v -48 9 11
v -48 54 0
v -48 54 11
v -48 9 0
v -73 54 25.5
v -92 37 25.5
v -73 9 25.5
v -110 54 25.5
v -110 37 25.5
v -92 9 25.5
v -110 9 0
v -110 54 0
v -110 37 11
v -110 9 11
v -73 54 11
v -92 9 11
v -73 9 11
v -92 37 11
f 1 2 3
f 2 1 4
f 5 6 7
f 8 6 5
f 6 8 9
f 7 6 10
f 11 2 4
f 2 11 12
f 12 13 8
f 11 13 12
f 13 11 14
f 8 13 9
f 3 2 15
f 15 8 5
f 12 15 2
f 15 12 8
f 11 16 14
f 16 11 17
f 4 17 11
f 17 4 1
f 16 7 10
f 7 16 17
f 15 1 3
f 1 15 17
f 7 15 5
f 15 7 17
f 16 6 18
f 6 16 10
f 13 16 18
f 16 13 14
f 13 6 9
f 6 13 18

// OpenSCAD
intersection() {
    difference () {
        // main
        translate([-110,9,0]) {
            cube([62,45,25.5]);
        };
        // usb - right cut
        translate([-73,9,11]) {
            rotate (a=0, v=[0,0,1]) {
                cube([25,78,19]);
            }
        };
        // rj9 - left cut
        translate([-110,9,11]) {
            rotate (a=0, v=[0,0,1]) {
                cube([18,28,19]);
            }
        };
    }
}
